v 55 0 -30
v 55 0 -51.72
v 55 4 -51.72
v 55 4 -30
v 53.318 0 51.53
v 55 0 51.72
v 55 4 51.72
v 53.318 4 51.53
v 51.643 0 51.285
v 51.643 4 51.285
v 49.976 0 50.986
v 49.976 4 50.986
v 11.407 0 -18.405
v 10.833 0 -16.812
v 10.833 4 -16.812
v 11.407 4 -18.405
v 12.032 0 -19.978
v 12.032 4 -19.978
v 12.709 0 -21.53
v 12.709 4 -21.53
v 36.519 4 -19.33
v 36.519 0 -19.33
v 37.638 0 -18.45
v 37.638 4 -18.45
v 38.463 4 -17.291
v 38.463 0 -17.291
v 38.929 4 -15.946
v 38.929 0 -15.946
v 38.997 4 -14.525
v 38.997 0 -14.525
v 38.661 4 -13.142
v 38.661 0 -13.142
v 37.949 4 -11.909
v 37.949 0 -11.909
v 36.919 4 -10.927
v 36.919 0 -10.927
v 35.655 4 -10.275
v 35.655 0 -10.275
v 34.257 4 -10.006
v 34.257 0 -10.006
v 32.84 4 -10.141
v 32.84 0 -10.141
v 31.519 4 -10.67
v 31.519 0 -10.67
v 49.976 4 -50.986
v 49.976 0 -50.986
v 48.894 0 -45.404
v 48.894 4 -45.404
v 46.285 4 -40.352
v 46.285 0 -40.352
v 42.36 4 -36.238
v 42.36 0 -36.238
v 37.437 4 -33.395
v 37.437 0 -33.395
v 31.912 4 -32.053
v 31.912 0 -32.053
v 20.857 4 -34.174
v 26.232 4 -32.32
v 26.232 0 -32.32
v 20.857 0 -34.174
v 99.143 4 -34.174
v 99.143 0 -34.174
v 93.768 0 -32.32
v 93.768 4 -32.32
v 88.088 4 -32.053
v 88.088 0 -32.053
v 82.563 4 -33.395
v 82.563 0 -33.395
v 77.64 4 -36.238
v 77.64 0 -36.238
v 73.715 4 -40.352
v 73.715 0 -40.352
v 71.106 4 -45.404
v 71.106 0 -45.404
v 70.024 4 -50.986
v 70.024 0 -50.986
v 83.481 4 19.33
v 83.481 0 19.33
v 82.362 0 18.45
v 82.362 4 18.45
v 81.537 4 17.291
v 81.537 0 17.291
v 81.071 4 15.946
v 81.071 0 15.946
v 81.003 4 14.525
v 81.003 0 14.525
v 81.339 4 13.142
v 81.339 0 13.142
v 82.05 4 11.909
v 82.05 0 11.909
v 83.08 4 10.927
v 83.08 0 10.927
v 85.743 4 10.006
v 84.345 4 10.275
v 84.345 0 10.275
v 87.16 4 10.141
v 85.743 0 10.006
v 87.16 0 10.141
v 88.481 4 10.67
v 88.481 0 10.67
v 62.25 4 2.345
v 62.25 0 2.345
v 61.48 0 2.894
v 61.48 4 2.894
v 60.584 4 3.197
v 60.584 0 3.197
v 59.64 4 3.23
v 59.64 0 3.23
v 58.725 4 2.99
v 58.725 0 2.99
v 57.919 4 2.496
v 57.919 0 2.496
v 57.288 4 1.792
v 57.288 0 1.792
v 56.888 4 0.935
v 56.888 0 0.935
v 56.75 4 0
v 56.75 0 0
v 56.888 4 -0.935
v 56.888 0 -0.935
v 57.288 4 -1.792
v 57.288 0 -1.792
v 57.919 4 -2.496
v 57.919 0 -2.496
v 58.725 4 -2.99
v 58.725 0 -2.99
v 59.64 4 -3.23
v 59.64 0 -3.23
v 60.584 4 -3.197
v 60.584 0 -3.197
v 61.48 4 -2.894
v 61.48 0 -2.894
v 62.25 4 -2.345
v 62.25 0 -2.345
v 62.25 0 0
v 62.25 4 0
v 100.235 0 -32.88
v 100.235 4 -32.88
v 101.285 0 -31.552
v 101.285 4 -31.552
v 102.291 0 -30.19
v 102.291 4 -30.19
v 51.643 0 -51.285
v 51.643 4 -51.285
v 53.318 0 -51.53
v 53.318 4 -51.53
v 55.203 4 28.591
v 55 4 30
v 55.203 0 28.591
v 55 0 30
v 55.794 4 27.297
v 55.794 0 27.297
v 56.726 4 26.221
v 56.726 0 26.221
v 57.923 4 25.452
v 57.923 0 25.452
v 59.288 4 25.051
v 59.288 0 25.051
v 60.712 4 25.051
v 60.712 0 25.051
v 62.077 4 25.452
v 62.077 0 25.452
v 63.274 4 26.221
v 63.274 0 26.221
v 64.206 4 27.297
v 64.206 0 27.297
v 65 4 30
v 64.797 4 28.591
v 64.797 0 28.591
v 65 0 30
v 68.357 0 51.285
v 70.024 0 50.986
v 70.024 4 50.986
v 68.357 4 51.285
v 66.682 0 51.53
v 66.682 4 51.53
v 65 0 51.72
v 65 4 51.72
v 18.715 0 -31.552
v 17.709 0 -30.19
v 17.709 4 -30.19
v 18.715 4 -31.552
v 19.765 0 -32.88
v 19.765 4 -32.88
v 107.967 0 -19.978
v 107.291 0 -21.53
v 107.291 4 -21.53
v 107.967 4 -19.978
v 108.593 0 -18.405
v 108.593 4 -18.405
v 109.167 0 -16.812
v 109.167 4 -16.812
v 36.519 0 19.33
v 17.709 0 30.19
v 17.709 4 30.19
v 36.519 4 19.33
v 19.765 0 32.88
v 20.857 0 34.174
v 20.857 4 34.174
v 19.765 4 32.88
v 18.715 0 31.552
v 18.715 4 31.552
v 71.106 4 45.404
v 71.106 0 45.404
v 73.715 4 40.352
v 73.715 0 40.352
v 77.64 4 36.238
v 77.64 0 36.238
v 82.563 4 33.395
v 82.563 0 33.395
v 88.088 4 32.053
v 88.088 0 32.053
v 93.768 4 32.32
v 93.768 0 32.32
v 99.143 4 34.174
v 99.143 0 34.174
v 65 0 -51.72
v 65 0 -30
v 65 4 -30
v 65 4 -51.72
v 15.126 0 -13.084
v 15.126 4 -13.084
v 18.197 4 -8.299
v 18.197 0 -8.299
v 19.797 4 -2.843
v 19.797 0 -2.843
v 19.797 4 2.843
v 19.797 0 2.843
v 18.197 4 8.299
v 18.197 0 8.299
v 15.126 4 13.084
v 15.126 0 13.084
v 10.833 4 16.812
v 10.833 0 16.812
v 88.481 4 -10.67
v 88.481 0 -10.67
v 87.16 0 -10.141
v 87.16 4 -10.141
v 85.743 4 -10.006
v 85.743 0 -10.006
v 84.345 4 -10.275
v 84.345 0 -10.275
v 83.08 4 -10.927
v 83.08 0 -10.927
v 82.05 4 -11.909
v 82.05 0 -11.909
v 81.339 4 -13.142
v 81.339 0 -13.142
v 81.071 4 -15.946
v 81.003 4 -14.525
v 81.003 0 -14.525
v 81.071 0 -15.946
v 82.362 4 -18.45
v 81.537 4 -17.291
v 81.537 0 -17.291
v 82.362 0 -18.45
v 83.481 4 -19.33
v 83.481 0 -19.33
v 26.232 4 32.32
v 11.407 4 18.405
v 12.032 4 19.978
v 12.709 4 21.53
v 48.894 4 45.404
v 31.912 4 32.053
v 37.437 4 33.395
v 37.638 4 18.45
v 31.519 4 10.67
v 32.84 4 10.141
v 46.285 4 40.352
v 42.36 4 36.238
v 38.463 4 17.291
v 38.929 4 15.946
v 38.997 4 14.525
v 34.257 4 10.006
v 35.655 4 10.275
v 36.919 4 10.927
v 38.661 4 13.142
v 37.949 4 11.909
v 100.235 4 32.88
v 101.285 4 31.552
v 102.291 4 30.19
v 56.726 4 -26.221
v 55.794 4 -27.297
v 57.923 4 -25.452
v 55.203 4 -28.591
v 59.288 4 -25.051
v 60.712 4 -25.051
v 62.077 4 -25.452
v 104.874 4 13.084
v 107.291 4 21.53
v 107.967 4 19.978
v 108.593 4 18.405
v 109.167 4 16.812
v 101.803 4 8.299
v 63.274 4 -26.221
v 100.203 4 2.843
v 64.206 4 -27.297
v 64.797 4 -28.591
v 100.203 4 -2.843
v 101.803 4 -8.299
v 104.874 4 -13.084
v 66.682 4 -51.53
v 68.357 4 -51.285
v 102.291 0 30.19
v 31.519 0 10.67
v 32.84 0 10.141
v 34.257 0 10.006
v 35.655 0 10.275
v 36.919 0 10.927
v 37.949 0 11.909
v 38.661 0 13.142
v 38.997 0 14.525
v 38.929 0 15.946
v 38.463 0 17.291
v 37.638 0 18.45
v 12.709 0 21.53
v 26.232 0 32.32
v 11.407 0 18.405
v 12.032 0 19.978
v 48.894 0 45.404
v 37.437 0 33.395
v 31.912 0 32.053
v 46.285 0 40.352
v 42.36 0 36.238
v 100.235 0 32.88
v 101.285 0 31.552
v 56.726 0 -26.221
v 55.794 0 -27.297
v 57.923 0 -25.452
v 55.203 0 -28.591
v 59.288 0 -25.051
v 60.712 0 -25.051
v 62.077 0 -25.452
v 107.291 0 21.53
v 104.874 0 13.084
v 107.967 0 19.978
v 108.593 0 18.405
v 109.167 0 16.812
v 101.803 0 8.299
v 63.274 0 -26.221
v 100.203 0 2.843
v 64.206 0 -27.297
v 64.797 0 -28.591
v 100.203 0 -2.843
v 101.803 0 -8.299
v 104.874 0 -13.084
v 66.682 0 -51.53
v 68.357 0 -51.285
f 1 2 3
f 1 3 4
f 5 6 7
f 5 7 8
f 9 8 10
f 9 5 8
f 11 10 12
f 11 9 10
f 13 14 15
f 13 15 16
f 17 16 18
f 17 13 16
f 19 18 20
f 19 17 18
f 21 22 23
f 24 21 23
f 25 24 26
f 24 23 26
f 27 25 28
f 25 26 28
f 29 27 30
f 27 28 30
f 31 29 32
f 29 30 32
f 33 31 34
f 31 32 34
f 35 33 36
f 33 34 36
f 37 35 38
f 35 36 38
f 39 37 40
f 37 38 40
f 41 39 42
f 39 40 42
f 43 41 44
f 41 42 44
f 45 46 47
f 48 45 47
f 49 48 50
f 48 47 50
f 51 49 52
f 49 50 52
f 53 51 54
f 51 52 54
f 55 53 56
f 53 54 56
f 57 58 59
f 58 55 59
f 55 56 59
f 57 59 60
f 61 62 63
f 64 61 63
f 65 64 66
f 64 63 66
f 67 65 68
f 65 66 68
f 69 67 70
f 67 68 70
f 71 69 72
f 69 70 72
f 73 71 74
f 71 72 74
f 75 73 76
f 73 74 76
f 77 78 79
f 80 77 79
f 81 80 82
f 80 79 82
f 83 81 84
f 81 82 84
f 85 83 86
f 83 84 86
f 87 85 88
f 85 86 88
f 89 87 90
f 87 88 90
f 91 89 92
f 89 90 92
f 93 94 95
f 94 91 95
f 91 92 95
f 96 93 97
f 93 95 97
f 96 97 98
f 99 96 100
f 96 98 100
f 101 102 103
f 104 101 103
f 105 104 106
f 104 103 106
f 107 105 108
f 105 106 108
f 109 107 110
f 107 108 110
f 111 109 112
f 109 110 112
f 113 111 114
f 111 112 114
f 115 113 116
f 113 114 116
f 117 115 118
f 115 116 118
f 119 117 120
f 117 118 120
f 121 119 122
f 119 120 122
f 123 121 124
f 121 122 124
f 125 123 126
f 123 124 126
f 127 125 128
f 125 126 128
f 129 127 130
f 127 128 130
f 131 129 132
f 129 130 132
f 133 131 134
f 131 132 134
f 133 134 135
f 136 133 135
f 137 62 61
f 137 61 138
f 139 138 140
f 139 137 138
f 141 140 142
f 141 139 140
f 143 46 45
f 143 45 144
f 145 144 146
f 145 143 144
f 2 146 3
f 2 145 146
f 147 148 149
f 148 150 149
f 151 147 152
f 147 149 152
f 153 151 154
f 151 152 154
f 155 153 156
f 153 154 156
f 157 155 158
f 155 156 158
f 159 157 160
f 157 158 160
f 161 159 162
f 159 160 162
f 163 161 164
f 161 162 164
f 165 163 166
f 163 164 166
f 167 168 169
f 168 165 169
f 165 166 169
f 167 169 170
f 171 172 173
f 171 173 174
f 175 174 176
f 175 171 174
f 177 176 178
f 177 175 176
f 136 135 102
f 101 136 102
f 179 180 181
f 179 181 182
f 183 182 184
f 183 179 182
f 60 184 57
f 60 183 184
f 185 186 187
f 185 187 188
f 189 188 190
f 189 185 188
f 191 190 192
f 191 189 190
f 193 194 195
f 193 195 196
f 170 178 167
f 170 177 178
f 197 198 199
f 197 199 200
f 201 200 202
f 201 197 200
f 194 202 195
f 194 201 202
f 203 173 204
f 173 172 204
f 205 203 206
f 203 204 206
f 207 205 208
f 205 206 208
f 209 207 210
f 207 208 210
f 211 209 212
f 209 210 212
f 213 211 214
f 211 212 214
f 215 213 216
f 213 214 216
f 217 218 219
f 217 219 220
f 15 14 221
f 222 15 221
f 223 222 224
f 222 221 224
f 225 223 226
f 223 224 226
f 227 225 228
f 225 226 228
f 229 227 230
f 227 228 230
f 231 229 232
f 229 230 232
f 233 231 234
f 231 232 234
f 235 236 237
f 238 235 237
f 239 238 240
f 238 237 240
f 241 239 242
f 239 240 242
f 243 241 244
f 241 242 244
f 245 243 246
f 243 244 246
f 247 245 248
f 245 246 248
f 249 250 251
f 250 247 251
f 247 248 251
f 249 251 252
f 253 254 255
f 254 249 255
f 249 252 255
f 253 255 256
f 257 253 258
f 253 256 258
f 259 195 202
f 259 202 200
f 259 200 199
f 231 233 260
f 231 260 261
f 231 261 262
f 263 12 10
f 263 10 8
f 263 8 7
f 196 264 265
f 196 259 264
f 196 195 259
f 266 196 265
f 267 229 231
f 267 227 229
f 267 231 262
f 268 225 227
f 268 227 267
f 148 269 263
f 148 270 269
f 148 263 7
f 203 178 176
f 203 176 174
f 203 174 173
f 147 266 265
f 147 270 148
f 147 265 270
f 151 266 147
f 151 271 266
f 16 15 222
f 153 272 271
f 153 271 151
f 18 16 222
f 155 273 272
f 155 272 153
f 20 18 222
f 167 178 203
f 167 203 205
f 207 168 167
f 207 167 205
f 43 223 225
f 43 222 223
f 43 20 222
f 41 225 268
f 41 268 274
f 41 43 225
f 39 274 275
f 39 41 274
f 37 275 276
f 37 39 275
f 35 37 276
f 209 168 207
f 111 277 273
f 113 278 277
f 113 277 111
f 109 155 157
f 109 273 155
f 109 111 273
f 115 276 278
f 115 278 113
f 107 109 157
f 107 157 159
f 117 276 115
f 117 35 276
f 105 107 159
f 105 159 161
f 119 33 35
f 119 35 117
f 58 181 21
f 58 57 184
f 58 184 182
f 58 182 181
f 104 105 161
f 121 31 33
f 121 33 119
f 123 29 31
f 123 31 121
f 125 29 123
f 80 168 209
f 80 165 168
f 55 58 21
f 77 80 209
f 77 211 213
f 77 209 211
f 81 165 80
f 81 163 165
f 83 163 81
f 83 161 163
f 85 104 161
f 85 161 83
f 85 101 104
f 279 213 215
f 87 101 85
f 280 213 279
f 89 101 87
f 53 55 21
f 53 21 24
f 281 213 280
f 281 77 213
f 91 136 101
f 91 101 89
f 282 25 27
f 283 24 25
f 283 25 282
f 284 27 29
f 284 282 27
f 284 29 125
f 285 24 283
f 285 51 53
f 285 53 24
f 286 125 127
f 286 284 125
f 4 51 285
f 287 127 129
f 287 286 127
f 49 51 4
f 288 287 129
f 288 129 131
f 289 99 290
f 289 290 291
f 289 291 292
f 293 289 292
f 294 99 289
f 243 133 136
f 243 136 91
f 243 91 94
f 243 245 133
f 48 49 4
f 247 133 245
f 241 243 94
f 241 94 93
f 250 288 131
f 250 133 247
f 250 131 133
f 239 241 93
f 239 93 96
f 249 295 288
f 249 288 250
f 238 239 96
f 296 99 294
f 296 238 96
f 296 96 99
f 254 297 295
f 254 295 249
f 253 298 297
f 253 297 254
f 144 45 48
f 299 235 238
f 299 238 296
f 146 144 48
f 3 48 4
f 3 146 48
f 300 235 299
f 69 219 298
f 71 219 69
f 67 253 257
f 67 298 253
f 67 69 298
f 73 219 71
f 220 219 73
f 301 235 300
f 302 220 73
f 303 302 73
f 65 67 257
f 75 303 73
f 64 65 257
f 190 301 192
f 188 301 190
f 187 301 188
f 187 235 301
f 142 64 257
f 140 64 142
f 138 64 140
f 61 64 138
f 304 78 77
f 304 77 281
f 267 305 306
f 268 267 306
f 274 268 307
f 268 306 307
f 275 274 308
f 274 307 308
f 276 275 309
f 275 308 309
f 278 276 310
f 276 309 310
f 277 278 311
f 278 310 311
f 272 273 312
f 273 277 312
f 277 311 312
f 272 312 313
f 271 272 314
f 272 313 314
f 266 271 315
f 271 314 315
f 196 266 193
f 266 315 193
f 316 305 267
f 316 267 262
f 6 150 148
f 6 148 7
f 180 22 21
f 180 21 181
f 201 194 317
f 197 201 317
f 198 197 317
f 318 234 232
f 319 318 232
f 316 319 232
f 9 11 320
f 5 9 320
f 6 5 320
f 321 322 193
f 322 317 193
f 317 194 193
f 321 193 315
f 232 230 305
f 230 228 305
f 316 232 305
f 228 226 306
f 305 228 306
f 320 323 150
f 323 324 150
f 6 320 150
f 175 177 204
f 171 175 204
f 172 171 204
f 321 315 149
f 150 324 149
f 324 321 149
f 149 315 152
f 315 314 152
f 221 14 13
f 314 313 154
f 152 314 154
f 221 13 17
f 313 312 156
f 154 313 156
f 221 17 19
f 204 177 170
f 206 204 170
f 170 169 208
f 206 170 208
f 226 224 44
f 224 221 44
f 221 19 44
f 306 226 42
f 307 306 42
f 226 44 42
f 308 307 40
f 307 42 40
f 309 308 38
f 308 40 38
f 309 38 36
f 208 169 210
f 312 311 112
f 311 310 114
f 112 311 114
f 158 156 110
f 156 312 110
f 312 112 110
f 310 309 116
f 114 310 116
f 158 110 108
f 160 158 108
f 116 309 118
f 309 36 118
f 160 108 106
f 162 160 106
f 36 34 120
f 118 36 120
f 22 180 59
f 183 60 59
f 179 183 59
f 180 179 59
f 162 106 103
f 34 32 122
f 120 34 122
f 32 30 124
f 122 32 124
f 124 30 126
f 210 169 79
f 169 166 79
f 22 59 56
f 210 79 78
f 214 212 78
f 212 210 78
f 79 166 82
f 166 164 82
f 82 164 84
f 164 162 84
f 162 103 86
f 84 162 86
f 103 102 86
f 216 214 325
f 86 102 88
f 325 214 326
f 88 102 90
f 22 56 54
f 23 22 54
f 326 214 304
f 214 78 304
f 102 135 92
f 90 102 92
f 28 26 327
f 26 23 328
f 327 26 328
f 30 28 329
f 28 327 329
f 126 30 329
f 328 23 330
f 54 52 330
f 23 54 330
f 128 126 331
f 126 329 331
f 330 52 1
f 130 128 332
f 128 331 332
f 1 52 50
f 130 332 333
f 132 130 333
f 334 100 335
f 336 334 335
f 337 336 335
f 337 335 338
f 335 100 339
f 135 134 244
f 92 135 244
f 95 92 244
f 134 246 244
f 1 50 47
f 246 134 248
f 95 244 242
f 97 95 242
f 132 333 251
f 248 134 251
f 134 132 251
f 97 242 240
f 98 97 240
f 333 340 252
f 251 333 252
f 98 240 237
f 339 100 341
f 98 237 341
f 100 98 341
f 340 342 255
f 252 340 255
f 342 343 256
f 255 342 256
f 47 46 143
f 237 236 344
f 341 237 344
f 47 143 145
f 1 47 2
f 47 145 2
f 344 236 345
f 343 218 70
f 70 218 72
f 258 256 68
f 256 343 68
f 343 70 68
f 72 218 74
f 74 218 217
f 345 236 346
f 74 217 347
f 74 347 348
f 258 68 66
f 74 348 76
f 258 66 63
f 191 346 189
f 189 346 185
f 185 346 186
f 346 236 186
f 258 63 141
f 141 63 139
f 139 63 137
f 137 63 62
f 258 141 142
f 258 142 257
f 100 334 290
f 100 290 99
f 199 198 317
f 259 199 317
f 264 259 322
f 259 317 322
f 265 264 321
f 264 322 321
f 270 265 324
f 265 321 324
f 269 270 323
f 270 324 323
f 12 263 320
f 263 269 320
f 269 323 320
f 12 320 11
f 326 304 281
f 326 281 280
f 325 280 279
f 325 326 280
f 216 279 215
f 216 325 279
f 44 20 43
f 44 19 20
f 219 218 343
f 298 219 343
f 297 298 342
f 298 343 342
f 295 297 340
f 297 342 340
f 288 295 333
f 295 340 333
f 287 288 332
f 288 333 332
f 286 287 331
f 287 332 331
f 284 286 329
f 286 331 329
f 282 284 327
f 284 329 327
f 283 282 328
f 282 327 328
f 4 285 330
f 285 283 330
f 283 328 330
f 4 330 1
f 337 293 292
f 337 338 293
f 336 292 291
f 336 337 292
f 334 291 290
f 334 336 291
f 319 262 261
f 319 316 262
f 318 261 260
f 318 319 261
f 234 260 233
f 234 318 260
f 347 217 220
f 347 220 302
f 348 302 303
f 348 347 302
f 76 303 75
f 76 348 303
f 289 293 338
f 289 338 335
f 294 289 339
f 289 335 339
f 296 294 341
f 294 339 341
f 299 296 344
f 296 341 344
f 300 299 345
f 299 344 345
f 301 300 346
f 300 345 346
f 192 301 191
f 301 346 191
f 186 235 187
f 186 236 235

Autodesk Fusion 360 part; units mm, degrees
sketch "Sketch1" plane through (0, 0, 0) normal (0, 1, 0) x (1, 0, 0)
  line L0 (36.5192, 19.3301) -> (17.7088, 30.1903)
  line L1 (12.7088, 21.5301) -> (31.5192, 10.6699)
  arc A0 (31.5192, 10.6699) -> (36.5192, 19.3301) centre (34.0192, 15) ccw
  arc A1 (10.8333, -16.8119) -> (10.8333, 16.8119) centre (0, 0) ccw
  arc A2 (31.5192, 10.6699) -> (36.5192, 19.3301) centre (34.0192, 15) ccw
  arc A3 (12.7088, 21.5301) -> (10.8333, 16.8119) centre (60, 0) ccw
  line L2 (31.5192, -10.6699) -> (12.7088, -21.5301)
  arc A4 (36.5192, -19.3301) -> (31.5192, -10.6699) centre (34.0192, -15) ccw
  line L3 (17.7088, -30.1903) -> (36.5192, -19.3301)
  arc A5 (49.9762, -50.9855) -> (20.8572, -34.1736) centre (30, -51.9615) ccw
  line L4 (55, -30) -> (55, -51.7204)
  arc A6 (65, -30) -> (55, -30) centre (60, -30) ccw
  line L5 (65, -51.7204) -> (65, -30)
  arc A7 (99.1428, -34.1736) -> (70.0238, -50.9855) centre (90, -51.9615) ccw
  line L6 (83.4807, -19.3301) -> (102.2911, -30.1903)
  arc A8 (88.4807, -10.6699) -> (83.4807, -19.3301) centre (85.9807, -15) ccw
  line L7 (107.2911, -21.5301) -> (88.4807, -10.6699)
  arc A9 (109.1666, 16.8119) -> (109.1666, -16.8119) centre (120, 0) ccw
  line L8 (88.4807, 10.6699) -> (107.2911, 21.5301)
  arc A10 (83.4807, 19.3301) -> (88.4807, 10.6699) centre (85.9807, 15) ccw
  line L9 (102.2911, 30.1903) -> (83.4807, 19.3301)
  arc A11 (70.0238, 50.9855) -> (99.1428, 34.1736) centre (90, 51.9615) ccw
  line L10 (65, 30) -> (65, 51.7204)
  arc A12 (55, 30) -> (65, 30) centre (60, 30) ccw
  line L11 (55, 51.7204) -> (55, 30)
  arc A13 (20.8572, 34.1736) -> (49.9762, 50.9855) centre (30, 51.9615) ccw
  arc A14 (55, 51.7204) -> (49.9762, 50.9855) centre (60, 0) ccw
  arc A15 (20.8572, 34.1736) -> (17.7054, 30.1856) centre (60, 0) ccw
  arc A16 (70.0238, 50.9855) -> (65, 51.7204) centre (60, 0) ccw
  arc A17 (102.2911, 30.1903) -> (99.1428, 34.1736) centre (60, 0) ccw
  arc A18 (109.1666, 16.8119) -> (107.2911, 21.5301) centre (60, 0) ccw
  arc A19 (107.2911, -21.5301) -> (109.1666, -16.8119) centre (60, 0) ccw
  arc A20 (99.1428, -34.1736) -> (102.2911, -30.1903) centre (60, 0) ccw
  arc A21 (65, -51.7204) -> (70.0238, -50.9855) centre (60, 0) ccw
  arc A22 (49.9762, -50.9855) -> (55, -51.7204) centre (60, 0) ccw
  arc A23 (10.8333, -16.8119) -> (12.7088, -21.5301) centre (60, 0) ccw
  arc A24 (17.7088, -30.1903) -> (20.8572, -34.1736) centre (60, 0) ccw
  line L12 (60, 0) -> (62.25, 0)
  line L13 (62.25, 2.3452) -> (62.25, -2.3452)
  arc A25 (62.25, 2.3452) -> (62.25, -2.3452) centre (60, 0) ccw
  dimension "d5" = 360
extrude "Extrude1" add sketch "Sketch1" along normal blind 4
